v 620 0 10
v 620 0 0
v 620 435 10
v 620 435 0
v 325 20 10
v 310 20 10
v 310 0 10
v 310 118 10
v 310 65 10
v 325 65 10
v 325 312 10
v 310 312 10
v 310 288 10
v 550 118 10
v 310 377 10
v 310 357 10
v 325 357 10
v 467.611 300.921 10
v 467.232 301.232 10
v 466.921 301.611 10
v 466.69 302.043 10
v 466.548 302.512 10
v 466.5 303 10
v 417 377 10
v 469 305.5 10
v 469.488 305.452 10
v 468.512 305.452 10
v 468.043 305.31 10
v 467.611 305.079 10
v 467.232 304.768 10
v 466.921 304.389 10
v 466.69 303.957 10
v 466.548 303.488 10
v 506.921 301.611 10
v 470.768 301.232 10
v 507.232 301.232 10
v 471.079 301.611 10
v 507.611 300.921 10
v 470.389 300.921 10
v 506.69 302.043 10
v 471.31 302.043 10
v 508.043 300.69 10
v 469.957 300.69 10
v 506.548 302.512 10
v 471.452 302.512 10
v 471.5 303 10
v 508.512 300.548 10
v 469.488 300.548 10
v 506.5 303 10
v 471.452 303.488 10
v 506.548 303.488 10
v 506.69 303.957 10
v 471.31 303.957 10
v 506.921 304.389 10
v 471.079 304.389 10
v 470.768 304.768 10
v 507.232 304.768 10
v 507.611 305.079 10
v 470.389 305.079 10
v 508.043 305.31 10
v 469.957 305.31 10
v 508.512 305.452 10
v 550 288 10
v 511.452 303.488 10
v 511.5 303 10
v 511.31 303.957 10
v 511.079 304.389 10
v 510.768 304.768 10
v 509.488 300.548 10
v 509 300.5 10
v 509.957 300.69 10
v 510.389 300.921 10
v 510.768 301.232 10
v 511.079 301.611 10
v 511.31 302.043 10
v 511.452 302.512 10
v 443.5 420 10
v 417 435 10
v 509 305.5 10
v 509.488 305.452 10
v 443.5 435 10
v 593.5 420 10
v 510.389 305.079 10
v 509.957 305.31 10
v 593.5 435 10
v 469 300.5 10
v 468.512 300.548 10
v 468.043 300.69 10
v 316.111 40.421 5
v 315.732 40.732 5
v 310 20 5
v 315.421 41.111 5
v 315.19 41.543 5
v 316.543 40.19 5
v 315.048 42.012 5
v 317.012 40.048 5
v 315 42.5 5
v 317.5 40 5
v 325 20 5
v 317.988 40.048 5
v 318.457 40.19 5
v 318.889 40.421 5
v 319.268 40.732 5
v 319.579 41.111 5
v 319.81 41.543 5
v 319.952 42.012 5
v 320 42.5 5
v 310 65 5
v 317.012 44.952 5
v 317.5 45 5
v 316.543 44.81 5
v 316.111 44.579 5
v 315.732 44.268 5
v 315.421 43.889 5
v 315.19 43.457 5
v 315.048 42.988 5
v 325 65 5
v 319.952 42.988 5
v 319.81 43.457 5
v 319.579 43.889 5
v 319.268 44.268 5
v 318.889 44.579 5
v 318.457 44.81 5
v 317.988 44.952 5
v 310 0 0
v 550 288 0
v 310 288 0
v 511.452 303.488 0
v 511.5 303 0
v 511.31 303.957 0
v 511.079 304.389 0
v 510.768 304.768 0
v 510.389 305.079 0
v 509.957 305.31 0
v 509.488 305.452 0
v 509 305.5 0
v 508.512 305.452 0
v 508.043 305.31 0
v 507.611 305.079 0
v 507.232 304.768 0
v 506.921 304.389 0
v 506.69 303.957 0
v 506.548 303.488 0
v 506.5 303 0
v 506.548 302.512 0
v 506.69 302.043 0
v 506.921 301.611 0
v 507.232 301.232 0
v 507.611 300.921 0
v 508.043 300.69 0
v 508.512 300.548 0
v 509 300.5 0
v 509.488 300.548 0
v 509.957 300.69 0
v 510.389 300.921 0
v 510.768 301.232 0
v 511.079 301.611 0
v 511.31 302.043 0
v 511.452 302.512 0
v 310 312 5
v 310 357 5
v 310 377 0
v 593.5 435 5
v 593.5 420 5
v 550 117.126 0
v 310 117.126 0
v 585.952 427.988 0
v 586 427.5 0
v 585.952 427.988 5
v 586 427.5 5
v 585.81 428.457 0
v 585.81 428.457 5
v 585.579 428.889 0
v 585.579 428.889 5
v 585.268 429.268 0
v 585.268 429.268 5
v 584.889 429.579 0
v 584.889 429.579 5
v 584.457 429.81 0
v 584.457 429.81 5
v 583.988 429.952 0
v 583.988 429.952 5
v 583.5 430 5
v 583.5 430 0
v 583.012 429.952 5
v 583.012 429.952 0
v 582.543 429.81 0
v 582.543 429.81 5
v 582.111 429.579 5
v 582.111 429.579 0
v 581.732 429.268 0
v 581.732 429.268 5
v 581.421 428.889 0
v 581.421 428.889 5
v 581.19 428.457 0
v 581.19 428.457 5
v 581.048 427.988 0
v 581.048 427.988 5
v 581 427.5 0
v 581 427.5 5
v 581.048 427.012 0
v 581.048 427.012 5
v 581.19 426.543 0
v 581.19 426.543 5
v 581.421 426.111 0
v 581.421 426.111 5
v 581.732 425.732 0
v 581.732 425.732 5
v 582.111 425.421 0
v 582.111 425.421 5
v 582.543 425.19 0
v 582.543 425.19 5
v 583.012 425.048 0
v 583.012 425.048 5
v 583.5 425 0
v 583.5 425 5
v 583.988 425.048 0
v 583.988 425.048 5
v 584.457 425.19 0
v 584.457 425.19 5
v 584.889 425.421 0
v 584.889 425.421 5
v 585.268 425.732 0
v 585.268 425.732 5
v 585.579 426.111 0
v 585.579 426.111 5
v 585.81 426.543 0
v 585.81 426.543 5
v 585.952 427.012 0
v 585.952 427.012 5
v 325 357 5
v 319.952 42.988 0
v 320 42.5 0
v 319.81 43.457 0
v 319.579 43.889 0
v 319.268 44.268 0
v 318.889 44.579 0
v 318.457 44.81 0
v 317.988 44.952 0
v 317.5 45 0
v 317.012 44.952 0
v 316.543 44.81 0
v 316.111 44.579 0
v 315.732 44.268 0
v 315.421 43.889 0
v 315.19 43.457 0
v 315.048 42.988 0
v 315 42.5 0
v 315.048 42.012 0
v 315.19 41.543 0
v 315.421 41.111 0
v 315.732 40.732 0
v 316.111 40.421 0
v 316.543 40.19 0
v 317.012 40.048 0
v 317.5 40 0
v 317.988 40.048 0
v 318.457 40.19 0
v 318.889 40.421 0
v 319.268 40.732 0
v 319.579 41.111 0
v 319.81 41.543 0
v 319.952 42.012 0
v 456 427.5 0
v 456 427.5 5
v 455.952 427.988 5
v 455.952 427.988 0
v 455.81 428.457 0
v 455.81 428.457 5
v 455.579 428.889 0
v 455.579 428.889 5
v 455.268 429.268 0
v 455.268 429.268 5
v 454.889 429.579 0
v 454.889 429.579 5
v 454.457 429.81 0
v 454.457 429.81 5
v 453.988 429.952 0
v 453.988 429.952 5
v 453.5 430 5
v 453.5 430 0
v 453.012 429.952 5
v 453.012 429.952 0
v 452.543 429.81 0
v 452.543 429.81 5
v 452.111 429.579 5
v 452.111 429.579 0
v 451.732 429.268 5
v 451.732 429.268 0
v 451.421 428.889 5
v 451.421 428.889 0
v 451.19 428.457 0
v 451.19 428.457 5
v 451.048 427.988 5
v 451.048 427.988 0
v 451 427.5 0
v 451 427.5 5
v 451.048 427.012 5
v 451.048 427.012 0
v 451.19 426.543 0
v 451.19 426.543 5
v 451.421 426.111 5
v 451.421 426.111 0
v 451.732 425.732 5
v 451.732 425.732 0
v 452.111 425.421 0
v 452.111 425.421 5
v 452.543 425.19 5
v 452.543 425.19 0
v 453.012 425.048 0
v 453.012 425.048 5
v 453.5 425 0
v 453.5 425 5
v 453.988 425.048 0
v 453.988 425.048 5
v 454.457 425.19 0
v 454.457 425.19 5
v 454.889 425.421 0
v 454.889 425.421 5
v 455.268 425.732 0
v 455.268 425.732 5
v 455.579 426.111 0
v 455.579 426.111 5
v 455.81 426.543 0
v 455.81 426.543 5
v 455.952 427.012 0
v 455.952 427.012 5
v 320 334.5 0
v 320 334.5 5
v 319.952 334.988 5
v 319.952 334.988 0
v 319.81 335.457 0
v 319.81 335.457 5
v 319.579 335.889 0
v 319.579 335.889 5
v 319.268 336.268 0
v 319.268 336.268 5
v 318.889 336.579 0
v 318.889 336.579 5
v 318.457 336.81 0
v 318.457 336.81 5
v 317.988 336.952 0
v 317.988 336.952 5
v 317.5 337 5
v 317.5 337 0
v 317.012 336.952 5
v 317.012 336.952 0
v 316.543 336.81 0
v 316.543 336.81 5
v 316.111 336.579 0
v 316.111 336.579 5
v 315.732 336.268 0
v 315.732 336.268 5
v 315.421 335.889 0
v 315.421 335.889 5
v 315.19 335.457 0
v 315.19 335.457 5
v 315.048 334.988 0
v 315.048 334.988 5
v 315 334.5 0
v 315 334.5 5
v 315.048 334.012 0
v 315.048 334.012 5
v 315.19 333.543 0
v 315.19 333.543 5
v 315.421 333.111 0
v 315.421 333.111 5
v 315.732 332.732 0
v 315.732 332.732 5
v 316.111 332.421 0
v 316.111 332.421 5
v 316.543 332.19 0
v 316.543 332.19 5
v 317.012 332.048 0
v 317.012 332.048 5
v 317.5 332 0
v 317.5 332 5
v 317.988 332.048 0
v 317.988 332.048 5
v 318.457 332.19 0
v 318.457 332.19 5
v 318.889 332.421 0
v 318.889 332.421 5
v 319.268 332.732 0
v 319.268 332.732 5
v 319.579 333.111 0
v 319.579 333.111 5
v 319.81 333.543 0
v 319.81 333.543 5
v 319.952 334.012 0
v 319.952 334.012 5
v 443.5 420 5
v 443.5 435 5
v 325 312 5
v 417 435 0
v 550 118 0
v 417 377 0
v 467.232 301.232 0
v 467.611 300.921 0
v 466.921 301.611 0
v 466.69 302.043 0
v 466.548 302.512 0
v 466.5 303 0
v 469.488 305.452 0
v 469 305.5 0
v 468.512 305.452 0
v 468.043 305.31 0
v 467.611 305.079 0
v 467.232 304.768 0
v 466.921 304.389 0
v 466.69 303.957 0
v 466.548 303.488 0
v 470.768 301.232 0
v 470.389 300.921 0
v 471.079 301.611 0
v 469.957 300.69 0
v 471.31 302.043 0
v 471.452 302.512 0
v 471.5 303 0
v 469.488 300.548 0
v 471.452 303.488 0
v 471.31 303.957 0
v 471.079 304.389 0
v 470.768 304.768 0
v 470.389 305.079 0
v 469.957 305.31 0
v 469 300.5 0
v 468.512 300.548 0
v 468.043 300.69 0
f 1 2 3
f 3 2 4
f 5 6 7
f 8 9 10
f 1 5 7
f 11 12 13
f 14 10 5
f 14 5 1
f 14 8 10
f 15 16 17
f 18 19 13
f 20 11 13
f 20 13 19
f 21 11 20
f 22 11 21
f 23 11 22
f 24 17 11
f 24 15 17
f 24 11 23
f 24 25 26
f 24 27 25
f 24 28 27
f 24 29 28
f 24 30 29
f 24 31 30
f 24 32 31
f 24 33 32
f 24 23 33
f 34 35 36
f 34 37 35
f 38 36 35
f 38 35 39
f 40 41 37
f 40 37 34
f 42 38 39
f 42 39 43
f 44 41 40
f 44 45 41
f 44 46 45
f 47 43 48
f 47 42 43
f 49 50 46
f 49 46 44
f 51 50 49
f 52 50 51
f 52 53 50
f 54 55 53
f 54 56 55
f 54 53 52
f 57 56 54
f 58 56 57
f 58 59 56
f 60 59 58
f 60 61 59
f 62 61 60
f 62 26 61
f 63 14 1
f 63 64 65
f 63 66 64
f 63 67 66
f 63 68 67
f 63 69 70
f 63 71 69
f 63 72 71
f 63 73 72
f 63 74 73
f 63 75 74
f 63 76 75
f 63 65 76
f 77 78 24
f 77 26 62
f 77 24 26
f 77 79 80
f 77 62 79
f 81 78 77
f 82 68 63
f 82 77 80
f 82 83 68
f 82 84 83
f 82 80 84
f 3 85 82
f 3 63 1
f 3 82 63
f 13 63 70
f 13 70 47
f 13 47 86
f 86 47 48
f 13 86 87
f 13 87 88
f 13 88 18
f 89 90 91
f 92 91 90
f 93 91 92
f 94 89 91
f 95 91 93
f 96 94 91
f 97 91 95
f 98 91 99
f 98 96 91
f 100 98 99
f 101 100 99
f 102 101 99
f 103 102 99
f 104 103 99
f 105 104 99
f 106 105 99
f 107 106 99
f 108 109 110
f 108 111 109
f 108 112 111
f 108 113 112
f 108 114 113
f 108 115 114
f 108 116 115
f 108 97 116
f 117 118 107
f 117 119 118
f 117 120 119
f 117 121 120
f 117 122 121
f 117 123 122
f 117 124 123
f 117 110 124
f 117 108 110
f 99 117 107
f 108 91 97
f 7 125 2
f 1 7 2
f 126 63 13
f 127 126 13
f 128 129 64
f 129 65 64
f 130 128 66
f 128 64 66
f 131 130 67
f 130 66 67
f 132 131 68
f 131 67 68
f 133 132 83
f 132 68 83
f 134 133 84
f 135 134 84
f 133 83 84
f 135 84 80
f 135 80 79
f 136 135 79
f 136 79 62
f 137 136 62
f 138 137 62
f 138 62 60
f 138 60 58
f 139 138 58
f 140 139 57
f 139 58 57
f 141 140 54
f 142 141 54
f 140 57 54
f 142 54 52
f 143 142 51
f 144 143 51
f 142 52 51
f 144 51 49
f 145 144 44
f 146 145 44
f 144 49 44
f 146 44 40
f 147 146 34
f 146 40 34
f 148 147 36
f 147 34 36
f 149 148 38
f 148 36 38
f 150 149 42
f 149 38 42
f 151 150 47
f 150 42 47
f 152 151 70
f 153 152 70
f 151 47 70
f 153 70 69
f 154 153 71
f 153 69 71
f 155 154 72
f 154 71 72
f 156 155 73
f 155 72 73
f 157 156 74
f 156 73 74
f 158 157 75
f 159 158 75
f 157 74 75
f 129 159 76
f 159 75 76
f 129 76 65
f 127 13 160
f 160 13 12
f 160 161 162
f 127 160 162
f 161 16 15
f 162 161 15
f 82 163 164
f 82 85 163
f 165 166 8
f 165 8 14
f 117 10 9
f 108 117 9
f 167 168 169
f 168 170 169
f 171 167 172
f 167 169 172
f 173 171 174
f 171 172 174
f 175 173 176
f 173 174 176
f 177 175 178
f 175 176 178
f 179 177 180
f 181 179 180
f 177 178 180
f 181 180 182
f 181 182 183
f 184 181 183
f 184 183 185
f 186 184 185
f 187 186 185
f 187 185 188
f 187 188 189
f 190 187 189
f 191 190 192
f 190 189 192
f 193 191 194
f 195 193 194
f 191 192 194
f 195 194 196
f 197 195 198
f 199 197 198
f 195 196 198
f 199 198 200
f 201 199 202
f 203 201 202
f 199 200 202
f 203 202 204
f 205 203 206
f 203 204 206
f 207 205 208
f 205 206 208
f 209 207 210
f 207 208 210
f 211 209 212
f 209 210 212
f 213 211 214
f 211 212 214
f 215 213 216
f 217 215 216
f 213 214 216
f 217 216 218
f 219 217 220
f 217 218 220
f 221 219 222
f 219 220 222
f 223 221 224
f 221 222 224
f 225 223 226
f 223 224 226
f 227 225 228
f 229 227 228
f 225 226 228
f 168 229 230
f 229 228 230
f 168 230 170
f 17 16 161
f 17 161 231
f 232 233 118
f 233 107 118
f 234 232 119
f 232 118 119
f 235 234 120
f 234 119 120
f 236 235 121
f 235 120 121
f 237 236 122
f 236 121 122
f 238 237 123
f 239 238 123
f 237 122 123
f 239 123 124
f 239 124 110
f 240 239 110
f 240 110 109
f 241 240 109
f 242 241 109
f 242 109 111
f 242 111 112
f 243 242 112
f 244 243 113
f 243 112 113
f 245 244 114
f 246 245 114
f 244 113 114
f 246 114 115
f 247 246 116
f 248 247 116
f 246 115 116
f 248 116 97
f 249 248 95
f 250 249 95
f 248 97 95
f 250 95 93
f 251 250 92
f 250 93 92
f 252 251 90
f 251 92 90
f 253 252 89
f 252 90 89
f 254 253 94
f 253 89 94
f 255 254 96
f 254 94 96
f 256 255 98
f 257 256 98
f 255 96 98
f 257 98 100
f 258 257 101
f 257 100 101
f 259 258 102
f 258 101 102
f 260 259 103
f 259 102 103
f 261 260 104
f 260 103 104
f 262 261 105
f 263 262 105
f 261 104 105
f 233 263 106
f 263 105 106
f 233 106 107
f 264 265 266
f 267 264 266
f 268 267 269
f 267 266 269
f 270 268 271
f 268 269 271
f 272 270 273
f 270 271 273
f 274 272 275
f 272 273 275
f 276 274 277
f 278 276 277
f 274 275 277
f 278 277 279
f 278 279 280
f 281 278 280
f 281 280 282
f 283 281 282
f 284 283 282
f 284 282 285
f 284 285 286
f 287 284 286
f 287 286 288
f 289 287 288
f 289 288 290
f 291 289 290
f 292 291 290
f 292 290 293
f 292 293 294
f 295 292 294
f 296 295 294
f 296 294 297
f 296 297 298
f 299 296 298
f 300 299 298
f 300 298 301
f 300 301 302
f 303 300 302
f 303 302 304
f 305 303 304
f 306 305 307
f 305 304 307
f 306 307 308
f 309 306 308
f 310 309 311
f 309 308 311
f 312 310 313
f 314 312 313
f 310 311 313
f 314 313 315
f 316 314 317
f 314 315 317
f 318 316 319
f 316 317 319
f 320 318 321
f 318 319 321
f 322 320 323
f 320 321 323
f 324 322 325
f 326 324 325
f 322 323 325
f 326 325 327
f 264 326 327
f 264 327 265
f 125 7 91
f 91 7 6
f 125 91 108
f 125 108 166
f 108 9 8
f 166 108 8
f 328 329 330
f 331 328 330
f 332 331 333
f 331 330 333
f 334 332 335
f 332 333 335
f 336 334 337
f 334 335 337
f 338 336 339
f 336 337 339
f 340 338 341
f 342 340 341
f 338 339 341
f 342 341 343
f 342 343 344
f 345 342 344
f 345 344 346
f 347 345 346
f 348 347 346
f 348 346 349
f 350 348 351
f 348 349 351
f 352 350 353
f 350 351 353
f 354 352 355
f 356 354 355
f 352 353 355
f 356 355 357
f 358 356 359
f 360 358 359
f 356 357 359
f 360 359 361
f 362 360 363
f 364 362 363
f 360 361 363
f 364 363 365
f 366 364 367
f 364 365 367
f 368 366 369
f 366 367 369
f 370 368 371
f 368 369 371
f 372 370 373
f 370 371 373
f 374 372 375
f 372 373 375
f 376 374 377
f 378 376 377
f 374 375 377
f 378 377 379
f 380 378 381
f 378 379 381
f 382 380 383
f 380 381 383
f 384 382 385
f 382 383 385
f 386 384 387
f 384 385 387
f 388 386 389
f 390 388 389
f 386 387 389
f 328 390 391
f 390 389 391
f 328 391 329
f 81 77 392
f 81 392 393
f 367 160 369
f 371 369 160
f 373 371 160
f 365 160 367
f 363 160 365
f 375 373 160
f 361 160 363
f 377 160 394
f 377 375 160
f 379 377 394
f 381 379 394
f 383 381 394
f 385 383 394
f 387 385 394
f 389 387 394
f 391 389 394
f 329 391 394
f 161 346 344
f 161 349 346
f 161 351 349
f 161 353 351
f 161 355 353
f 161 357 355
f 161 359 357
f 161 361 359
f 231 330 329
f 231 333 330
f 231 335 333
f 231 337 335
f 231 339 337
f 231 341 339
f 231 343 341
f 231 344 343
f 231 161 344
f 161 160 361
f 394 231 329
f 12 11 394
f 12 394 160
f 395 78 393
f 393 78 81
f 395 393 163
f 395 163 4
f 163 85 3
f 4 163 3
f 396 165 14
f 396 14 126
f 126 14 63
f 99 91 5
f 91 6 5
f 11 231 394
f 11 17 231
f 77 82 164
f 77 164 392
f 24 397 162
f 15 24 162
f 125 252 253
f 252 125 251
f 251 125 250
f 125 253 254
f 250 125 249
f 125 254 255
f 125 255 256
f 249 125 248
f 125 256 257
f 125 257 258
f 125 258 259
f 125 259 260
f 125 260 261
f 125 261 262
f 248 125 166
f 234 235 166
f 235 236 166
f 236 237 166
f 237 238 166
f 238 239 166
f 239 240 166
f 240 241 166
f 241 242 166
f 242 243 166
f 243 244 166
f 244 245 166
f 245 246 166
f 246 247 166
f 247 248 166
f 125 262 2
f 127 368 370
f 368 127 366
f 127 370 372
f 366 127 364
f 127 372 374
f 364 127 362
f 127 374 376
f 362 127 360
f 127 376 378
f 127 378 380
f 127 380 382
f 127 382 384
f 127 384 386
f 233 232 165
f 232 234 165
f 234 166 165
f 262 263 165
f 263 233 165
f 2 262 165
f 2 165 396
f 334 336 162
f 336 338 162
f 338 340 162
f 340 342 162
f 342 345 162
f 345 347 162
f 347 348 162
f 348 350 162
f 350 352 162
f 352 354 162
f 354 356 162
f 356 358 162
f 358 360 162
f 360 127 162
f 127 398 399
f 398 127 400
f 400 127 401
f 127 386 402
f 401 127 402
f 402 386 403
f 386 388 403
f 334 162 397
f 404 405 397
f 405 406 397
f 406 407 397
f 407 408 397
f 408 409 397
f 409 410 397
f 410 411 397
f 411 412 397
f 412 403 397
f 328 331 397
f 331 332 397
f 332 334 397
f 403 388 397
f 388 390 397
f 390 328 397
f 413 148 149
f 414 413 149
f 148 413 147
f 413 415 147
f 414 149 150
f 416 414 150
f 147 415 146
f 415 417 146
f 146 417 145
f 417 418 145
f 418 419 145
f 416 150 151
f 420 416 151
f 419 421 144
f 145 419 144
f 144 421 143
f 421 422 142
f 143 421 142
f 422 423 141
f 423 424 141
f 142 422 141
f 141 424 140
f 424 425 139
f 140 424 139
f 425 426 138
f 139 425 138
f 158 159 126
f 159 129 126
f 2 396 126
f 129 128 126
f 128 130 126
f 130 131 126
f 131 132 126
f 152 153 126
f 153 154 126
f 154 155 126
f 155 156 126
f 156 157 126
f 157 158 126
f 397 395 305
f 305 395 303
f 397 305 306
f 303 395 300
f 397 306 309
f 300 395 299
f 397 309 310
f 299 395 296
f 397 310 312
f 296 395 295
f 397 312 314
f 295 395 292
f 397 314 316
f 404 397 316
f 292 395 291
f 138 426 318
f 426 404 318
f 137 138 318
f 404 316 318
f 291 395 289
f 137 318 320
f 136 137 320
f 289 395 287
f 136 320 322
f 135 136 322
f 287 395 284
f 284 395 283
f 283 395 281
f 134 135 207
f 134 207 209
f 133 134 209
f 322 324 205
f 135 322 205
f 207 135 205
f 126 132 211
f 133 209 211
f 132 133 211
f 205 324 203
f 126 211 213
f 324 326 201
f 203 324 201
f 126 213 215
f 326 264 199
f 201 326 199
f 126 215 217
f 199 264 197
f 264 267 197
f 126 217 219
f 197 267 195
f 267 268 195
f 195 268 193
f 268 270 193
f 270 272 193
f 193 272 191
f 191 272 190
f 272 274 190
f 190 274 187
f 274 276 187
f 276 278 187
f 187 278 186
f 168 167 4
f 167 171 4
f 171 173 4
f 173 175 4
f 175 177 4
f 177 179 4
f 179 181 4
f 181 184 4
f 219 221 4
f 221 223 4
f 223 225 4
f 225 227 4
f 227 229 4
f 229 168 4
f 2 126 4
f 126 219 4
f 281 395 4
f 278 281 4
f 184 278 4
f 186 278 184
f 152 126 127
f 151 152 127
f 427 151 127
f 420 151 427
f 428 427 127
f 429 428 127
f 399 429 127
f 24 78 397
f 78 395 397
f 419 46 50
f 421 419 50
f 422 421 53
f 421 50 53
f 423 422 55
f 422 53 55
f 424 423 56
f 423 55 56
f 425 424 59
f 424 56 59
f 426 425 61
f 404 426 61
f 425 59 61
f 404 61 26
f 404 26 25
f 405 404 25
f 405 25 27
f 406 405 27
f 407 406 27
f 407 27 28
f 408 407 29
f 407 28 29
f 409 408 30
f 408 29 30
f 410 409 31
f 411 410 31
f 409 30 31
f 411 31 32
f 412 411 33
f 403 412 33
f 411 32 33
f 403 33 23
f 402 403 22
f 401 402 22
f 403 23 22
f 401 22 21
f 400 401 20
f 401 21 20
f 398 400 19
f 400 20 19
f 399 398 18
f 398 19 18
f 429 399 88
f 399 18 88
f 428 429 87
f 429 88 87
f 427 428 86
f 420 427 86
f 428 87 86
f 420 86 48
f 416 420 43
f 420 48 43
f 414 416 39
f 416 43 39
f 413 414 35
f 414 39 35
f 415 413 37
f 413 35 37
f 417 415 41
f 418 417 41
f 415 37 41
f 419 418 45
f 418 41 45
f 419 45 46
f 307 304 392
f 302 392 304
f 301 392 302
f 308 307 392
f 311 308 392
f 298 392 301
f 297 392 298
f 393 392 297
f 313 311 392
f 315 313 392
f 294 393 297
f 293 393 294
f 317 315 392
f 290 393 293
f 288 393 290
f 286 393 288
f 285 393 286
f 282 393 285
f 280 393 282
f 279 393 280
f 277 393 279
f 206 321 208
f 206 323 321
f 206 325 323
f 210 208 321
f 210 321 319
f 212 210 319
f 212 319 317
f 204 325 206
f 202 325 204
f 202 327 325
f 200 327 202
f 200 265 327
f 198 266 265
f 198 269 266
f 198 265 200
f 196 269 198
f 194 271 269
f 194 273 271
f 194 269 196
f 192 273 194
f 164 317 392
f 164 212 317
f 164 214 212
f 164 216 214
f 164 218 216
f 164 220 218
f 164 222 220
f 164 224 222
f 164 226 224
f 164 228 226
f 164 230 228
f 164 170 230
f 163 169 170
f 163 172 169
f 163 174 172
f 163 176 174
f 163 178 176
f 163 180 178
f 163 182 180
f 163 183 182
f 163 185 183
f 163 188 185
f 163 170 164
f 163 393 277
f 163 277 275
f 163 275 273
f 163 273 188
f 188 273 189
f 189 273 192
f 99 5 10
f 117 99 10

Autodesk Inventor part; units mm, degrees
ref_plane "YZ Plane" through (0, 0, 0) normal (1, 0, 0) x (0, 1, 0)
ref_plane "XZ Plane" through (0, 0, 0) normal (0, 1, 0) x (-1, 0, 0)
ref_plane "XY Plane" through (0, 0, 0) normal (0, 0, 1) x (1, 0, 0)
sketch "Sketch1" plane through (0, 0, 0) normal (0, 0, 1) x (1, 0, 0)
  line L0 (0, 0) -> (620, 0)
  line L1 (620, 0) -> (620, 620)
  line L2 (620, 620) -> (0, 620)
  line L3 (0, 620) -> (0, 0)
  line L4 (203, 491) -> (417, 491)
  line L5 (417, 491) -> (417, 377)
  line L6 (417, 377) -> (203, 377)
  line L7 (203, 377) -> (203, 491)
  line L8 (620, 0) -> (310, 0)
  line L9 (310, 0) -> (310, 435)
  line L10 (310, 435) -> (620, 435)
  line L11 (620, 435) -> (620, 0)
  point P0 (310, 491)
  point P1 (310, 620)
  dimension "d0" = 620
  dimension "d1" = 620
  dimension "d2" = 214
  dimension "d3" = 114
  dimension "d4" = 129
  dimension "d28" = 435
extrude "Extrusion1" add sketch "Sketch1" along normal blind 10 contours L3 L2 L1 L10 L5 L4 L7 L6 L9 L0 | L9 L6 L5 L10 L1 L0
sketch "Sketch6" plane through (0, 0, 10) normal (0, 0, 1) x (1, 0, 0)
  line L0 (0, 0) -> (620, 0) projected
  line L1 (620, 0) -> (310, 0)
  line L2 (310, 0) -> (310, 435)
  line L3 (310, 435) -> (620, 435)
  line L4 (620, 435) -> (620, 0)
  line L5 (620, 620) -> (0, 620) projected
  line L6 (620, 435) -> (0, 435)
  line L7 (0, 435) -> (0, 620)
  line L8 (0, 620) -> (620, 620)
  line L9 (620, 620) -> (620, 435)
  line L10 (310, 435) -> (0, 435)
  line L11 (0, 435) -> (0, 0)
  line L12 (0, 0) -> (310, 0)
  line L13 (310, 0) -> (310, 435)
  point P0 (310, 620)
  dimension "d29" = 435
extrude "Extrusion6" cut sketch "Sketch6" against normal through all contours L11 L6 L2 L0 | L7 L5 L9 L3 L6
sketch "Sketch7" plane through (0, 0, 10) normal (0, 0, 1) x (1, 0, 0)
  line L0 (310, 377) -> (310, 0) projected
  line L1 (417, 435) -> (620, 435) projected
  line L2 (443.5, 435) -> (593.5, 435)
  line L3 (593.5, 435) -> (593.5, 420)
  line L4 (593.5, 420) -> (443.5, 420)
  line L5 (443.5, 420) -> (443.5, 435)
  line L6 (310, 357) -> (325, 357)
  line L7 (325, 357) -> (325, 312)
  line L8 (325, 312) -> (310, 312)
  line L9 (310, 312) -> (310, 357)
  line L10 (310, 20) -> (325, 20)
  line L11 (325, 20) -> (325, 65)
  line L12 (325, 65) -> (310, 65)
  line L13 (310, 65) -> (310, 20)
  line L14 (417, 377) -> (310, 377) projected
  line L15 (310, 0) -> (620, 0) projected
  point P0 (0, 0)
  point P1 (518.5, 435)
  dimension "d34" = 150
  dimension "d35" = 15
  dimension "d48" = 15
  dimension "d49" = 45
  dimension "d50" = 15
  dimension "d51" = 45
  dimension "d52" = 20
  dimension "d53" = 20
extrude "Extrusion7" cut sketch "Sketch7" against normal blind 5
sketch "Sketch8" plane through (0, 0, 5) normal (0, 0, 1) x (1, 0, 0)
  circle A0 centre (453.5, 427.5) radius 2.5
  circle A1 centre (583.5, 427.5) radius 2.5
  circle A2 centre (317.5, 334.5) radius 2.5
  circle A3 centre (317.5, 42.5) radius 2.5
  line L0 (310, 312) -> (310, 357) projected
  line L1 (325, 312) -> (310, 312) projected
  line L2 (325, 357) -> (325, 312) projected
  line L3 (310, 357) -> (325, 357) projected
  line L4 (443.5, 420) -> (443.5, 435) projected
  line L5 (593.5, 420) -> (443.5, 420) projected
  line L6 (593.5, 435) -> (593.5, 420) projected
  line L7 (443.5, 435) -> (593.5, 435) projected
  line L8 (310, 20) -> (310, 65) projected
  line L9 (325, 20) -> (310, 20) projected
  line L10 (325, 65) -> (325, 20) projected
  line L11 (310, 65) -> (325, 65) projected
  line L12 (310, 20) -> (310, 65) projected
  point P0 (0, 0)
  point P1 (593.5, 427.5)
  point P2 (443.5, 427.5)
  point P3 (317.5, 357)
  point P4 (317.5, 65)
  point P5 (310, 42.5)
  point P6 (310, 334.5)
  dimension "d38" = 5
  dimension "d39" = 5
  dimension "d40" = 5
  dimension "d54" = 10
  dimension "d55" = 10
extrude "Extrusion8" cut sketch "Sketch8" against normal through all contours A0 | A1 | A2 | A3
sketch "Sketch9" plane through (0, 0, 10) normal (0, 0, 1) x (1, 0, 0)
  line L0 (550, 288) -> (310, 288)
  line L1 (310, 288) -> (310, 118)
  line L2 (310, 118) -> (550, 118)
  line L3 (550, 118) -> (550, 288)
  line L4 (310, 312) -> (310, 65) projected
  line L5 (325, 312) -> (310, 312) projected
  point P0 (0, 0)
  dimension "d56" = 240
  dimension "d57" = 170
  dimension "d67" = 24
extrude "Extrusion9" cut sketch "Sketch9" against normal through all
sketch "Sketch10" plane through (0, 0, 10) normal (0, 0, 1) x (1, 0, 0)
  circle A0 centre (509, 303) radius 2.5
  circle A1 centre (469, 303) radius 2.5
  line L0 (550, 288) -> (550, 118) projected
  line L1 (310, 288) -> (550, 288) projected
  point P0 (0, 0)
  dimension "d60" = 5
  dimension "d61" = 5
  dimension "d62" = 41
  dimension "d63" = 40
  dimension "d64" = 15
extrude "Extrusion10" cut sketch "Sketch10" along normal through all both and the other way through all
chamfer "Chamfer1" distance 10 angle 5 1 edges at (430, 118, 0) measured on face at (390, 118, 6.6667)
properties part number "TC001b" material "ABS Plastic"
